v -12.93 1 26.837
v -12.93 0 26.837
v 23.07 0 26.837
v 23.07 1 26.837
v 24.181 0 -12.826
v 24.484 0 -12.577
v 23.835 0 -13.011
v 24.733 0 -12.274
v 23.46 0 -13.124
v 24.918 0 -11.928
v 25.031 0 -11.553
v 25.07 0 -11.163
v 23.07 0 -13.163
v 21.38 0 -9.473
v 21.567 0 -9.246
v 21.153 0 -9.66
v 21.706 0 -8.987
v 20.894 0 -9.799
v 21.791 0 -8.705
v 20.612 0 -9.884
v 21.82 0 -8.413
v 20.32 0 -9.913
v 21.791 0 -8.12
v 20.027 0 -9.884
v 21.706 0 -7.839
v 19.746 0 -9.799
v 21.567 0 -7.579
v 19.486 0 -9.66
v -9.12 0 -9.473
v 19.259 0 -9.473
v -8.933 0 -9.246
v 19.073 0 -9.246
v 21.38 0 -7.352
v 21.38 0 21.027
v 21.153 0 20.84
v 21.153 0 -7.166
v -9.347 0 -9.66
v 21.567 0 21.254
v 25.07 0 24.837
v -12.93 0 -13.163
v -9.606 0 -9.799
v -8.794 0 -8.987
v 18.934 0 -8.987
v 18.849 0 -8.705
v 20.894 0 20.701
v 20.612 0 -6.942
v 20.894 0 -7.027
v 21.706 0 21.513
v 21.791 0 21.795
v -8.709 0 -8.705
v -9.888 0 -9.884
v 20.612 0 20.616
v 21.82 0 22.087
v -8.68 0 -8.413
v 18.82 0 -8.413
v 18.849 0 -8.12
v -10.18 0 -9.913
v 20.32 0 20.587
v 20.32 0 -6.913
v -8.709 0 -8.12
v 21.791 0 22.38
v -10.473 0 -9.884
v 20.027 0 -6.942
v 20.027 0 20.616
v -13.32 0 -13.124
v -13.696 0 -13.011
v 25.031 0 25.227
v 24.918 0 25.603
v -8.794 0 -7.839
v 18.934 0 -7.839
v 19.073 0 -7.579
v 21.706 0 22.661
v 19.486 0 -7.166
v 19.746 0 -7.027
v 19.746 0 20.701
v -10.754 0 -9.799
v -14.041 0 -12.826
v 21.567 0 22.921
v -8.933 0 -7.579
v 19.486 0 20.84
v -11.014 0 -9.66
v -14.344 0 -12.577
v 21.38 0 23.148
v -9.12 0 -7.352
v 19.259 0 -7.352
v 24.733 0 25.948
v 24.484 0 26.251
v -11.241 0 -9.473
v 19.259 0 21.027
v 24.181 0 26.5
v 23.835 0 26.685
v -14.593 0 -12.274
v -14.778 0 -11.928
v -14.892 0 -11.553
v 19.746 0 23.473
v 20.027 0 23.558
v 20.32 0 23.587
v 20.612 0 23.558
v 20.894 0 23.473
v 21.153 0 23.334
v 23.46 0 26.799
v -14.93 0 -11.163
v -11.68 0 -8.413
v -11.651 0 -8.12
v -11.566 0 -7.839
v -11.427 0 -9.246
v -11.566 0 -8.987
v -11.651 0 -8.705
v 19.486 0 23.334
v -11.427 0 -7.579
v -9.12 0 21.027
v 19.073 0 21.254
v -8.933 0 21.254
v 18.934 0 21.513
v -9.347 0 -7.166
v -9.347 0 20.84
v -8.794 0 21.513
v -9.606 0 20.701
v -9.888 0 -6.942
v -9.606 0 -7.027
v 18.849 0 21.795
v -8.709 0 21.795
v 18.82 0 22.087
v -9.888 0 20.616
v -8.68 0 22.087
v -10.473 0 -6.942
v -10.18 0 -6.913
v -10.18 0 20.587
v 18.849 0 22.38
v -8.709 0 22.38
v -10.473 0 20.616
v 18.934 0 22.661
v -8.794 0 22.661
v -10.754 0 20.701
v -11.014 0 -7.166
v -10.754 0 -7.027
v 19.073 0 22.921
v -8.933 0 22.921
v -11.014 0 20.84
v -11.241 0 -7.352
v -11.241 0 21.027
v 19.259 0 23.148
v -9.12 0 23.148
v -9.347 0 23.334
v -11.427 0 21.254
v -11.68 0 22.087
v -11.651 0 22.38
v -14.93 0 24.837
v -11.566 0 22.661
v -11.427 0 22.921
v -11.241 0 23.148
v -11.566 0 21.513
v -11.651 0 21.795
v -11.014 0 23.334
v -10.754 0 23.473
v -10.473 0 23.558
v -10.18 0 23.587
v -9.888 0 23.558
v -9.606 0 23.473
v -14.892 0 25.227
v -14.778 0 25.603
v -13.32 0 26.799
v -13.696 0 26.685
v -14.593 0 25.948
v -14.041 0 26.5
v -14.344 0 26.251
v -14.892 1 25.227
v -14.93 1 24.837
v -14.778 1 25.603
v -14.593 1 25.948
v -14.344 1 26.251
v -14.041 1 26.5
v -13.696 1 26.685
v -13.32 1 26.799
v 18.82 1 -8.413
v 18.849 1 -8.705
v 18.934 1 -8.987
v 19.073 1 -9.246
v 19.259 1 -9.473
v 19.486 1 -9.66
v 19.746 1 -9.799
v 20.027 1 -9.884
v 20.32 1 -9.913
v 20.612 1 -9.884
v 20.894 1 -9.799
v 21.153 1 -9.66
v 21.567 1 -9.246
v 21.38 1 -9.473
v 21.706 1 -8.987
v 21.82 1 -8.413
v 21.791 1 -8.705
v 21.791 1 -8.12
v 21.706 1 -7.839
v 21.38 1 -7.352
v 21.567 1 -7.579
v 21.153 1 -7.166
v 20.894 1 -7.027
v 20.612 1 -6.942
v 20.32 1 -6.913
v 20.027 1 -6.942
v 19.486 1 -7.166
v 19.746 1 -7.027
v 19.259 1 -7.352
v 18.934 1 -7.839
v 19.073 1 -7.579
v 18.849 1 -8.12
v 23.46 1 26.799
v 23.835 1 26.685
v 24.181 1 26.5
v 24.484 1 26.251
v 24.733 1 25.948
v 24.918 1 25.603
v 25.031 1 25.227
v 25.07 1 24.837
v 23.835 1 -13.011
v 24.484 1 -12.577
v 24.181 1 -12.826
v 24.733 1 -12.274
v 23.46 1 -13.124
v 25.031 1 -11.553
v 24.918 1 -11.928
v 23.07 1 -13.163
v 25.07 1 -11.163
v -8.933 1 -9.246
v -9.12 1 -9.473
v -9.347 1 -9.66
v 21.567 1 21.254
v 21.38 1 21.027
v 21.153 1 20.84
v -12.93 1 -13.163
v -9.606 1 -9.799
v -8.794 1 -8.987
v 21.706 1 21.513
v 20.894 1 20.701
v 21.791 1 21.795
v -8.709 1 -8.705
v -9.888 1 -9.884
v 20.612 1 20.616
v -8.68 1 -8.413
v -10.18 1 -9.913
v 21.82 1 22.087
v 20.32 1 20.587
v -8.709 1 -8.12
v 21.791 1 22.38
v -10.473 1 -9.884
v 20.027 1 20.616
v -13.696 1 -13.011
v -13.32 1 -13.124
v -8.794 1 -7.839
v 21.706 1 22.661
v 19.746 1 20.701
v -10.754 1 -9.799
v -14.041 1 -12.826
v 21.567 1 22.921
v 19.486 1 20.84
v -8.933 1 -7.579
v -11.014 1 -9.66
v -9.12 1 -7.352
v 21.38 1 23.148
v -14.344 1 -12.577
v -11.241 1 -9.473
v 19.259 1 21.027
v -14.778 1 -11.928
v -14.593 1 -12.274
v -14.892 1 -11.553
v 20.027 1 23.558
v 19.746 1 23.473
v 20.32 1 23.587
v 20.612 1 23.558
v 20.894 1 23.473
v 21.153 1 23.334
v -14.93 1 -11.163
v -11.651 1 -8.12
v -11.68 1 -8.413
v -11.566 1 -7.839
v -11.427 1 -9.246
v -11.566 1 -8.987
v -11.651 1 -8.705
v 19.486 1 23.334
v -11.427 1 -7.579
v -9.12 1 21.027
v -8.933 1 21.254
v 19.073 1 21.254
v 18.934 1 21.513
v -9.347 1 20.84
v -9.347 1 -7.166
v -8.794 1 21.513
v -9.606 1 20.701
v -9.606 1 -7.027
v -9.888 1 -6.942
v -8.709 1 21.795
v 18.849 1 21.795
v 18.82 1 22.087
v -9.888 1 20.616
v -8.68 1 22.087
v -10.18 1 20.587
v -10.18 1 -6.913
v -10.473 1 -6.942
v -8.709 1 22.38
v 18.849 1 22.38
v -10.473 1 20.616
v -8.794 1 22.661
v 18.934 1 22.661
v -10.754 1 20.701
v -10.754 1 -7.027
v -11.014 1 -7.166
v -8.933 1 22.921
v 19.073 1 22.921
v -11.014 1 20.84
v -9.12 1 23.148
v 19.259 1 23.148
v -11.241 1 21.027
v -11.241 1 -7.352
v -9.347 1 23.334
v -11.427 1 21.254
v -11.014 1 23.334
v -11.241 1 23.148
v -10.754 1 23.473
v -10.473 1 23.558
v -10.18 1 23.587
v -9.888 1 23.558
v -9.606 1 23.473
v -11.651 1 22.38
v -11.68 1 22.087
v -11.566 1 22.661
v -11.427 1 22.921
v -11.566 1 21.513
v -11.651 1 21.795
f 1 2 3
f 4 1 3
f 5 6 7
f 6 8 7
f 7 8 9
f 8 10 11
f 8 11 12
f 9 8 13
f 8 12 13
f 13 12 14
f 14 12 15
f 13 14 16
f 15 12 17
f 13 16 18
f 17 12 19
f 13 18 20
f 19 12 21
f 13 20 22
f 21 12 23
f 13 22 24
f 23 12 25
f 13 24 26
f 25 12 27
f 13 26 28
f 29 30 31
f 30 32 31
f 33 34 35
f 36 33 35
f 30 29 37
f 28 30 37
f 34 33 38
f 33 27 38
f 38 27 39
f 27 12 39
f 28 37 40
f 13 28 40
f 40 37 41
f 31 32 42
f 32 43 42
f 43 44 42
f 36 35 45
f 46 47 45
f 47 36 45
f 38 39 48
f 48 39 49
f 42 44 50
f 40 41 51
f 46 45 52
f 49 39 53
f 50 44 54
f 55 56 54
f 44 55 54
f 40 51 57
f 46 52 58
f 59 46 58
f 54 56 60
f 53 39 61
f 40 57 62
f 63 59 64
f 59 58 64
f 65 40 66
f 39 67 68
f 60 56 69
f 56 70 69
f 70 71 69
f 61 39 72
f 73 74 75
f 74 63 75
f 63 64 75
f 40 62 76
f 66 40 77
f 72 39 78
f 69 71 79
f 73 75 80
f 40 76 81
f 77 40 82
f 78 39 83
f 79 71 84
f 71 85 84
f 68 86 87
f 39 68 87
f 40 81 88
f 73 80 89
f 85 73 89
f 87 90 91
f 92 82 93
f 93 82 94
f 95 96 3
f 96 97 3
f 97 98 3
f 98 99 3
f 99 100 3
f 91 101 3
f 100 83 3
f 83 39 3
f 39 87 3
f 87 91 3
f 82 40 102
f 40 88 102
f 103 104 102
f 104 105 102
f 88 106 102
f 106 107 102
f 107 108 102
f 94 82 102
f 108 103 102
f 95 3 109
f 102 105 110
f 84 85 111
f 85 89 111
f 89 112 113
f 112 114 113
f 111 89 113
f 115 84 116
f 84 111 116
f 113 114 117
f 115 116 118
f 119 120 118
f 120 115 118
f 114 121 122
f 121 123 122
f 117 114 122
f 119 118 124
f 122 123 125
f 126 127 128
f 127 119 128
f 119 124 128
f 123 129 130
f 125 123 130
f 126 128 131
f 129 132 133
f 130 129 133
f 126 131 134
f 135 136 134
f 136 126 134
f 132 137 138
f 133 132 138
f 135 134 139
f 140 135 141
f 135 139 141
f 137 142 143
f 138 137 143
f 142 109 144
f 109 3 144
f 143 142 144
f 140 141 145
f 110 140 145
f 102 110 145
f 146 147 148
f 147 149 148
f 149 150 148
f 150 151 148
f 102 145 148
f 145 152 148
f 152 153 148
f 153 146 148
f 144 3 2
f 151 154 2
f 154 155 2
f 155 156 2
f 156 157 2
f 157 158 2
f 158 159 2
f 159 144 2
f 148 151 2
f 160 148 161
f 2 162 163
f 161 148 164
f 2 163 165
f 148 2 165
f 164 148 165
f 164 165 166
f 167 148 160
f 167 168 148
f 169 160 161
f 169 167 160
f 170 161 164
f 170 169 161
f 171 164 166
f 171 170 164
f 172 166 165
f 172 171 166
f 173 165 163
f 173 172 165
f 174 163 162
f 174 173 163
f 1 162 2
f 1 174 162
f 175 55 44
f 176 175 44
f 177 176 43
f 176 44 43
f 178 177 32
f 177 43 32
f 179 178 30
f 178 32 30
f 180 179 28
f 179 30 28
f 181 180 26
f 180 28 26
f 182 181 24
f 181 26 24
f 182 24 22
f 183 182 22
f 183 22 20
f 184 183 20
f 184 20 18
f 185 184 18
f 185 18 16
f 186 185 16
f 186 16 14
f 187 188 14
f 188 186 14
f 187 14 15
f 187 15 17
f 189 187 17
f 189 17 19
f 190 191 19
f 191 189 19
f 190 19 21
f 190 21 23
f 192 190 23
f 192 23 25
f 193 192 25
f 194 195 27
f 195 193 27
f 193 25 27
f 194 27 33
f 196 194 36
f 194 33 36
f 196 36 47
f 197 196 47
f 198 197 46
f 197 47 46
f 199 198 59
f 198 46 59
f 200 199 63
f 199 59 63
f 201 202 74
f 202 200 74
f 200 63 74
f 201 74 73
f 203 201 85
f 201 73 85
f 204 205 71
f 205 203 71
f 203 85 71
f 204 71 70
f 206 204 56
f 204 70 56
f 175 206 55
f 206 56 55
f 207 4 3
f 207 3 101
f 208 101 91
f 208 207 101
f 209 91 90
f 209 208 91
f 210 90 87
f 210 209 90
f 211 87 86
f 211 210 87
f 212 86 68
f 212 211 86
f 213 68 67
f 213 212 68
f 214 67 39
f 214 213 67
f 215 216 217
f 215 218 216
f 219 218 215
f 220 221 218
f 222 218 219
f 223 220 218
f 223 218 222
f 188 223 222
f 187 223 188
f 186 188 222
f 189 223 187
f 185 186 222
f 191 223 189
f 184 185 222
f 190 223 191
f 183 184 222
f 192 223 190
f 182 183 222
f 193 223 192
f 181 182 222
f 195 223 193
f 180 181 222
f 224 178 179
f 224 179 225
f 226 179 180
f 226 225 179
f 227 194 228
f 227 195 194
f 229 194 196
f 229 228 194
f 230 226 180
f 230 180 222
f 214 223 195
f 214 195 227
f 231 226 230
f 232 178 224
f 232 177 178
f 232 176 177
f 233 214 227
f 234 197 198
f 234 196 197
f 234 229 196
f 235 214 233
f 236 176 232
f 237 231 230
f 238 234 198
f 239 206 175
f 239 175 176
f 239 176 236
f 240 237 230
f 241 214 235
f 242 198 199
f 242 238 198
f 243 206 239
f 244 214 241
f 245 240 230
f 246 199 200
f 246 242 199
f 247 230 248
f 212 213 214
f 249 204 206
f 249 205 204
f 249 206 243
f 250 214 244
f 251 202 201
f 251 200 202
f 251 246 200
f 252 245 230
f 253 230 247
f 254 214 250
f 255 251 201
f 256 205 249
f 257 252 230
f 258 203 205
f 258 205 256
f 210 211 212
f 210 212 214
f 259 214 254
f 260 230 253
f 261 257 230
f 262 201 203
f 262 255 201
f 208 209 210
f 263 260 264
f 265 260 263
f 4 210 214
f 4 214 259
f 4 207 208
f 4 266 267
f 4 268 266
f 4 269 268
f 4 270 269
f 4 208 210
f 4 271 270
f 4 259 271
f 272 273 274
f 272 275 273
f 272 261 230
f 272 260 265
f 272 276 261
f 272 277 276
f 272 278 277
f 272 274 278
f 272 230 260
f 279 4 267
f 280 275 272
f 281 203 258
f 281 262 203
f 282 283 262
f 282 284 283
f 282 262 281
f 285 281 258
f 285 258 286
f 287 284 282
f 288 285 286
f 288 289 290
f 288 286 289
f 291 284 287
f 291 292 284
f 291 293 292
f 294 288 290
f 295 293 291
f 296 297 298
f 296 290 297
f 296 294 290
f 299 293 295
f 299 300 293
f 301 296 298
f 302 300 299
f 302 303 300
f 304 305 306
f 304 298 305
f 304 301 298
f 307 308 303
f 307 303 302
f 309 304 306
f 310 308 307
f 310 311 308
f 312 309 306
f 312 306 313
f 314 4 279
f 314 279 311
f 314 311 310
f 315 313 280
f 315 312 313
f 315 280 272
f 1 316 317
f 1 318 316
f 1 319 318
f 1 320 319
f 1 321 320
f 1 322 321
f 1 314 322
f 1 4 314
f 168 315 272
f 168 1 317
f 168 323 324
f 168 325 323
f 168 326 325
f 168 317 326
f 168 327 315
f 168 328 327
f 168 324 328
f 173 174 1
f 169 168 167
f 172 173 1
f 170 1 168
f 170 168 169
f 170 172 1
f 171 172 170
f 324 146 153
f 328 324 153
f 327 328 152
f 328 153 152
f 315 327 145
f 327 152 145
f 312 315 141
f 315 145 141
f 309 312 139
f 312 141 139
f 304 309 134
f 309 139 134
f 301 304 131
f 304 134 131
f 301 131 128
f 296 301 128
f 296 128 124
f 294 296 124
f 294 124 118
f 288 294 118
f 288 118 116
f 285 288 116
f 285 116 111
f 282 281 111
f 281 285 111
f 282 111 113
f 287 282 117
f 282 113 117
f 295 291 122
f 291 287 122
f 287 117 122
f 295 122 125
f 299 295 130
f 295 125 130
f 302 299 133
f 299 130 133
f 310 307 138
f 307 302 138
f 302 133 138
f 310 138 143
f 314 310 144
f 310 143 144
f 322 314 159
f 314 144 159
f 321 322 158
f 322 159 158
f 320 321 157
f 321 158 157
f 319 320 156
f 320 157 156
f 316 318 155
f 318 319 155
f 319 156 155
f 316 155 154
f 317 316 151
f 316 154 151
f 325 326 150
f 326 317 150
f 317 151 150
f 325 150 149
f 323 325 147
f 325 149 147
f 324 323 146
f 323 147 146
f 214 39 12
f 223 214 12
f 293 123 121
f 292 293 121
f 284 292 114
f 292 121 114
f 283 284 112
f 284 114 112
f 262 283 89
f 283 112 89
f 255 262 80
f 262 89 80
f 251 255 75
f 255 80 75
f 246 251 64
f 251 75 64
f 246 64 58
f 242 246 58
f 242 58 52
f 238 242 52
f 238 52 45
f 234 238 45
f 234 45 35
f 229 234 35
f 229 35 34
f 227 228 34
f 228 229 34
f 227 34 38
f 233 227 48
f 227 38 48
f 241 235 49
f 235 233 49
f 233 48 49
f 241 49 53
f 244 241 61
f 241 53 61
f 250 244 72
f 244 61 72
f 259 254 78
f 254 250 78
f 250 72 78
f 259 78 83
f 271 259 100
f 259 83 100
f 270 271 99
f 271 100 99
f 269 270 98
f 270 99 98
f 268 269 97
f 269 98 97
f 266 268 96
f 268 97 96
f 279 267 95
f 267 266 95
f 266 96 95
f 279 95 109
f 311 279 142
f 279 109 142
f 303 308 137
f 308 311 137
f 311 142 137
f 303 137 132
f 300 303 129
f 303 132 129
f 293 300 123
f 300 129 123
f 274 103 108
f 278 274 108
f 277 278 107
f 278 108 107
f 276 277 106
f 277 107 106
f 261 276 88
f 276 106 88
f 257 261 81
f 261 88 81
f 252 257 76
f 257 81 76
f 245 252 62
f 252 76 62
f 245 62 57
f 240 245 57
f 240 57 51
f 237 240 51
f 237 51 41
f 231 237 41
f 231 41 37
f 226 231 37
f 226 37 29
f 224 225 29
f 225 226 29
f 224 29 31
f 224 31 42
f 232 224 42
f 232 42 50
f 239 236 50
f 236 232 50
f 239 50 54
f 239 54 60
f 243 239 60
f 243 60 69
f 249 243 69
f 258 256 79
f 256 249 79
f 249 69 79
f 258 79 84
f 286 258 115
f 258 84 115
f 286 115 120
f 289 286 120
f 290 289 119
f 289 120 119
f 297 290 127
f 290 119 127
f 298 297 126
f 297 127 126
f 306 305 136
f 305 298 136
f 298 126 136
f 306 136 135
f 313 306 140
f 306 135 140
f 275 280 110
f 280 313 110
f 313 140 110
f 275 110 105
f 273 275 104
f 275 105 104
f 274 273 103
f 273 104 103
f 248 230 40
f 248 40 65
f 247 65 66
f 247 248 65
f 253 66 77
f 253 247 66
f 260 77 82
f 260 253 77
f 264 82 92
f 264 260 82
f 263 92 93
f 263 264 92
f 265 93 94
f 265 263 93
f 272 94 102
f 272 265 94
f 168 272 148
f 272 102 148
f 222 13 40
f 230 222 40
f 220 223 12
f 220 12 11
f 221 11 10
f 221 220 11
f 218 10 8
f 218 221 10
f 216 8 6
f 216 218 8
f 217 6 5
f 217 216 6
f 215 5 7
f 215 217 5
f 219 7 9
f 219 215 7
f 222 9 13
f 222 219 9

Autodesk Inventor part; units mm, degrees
ref_plane "YZ Plane" through (0, 0, 0) normal (1, 0, 0) x (0, 1, 0)
ref_plane "XZ Plane" through (0, 0, 0) normal (0, 1, 0) x (-1, 0, 0)
ref_plane "XY Plane" through (0, 0, 0) normal (0, 0, 1) x (1, 0, 0)
sketch "Sketch1" plane through (0, 0, 0) normal (0, 1, 0) x (-1, 0, 0)
  line L0 (14.9302, 26.8372) -> (-25.0698, 26.8372)
  line L1 (-25.0698, 26.8372) -> (-25.0698, -13.1628)
  line L2 (-25.0698, -13.1628) -> (14.9302, -13.1628)
  line L3 (14.9302, -13.1628) -> (14.9302, 26.8372)
  line L4 (-5.0698, 26.8372) -> (-5.0698, -13.1628)
  line L5 (14.9302, 6.8372) -> (-25.0698, 6.8372)
  circle A0 centre (10.1802, -8.4128) radius 1.5
  circle A1 centre (10.1802, 22.0872) radius 1.5
  circle A2 centre (-20.3198, 22.0872) radius 1.5
  circle A3 centre (-20.3198, -8.4128) radius 1.5
  point P0 (0, 0)
  dimension "d0" = 40
  dimension "d1" = 40
  dimension "d2" = 3
  dimension "d3" = 3
  dimension "d4" = 3
  dimension "d5" = 3
  dimension "d6" = 30.5
  dimension "d7" = 30.5
  dimension "d8" = 30.5
  dimension "d9" = 30.5
  dimension "d10" = 15.25
  dimension "d11" = 15.25
  dimension "d12" = 15.25
  dimension "d13" = 15.25
extrude "Extrusion1" add sketch "Sketch1" along normal blind 1
fillet "Fillet1" radius 2 4 edges at (-14.9302, 0.5, 26.8372) (25.0698, 0.5, 26.8372) (25.0698, 0.5, -13.1628) (-14.9302, 0.5, -13.1628)
properties part number "CHIP"
